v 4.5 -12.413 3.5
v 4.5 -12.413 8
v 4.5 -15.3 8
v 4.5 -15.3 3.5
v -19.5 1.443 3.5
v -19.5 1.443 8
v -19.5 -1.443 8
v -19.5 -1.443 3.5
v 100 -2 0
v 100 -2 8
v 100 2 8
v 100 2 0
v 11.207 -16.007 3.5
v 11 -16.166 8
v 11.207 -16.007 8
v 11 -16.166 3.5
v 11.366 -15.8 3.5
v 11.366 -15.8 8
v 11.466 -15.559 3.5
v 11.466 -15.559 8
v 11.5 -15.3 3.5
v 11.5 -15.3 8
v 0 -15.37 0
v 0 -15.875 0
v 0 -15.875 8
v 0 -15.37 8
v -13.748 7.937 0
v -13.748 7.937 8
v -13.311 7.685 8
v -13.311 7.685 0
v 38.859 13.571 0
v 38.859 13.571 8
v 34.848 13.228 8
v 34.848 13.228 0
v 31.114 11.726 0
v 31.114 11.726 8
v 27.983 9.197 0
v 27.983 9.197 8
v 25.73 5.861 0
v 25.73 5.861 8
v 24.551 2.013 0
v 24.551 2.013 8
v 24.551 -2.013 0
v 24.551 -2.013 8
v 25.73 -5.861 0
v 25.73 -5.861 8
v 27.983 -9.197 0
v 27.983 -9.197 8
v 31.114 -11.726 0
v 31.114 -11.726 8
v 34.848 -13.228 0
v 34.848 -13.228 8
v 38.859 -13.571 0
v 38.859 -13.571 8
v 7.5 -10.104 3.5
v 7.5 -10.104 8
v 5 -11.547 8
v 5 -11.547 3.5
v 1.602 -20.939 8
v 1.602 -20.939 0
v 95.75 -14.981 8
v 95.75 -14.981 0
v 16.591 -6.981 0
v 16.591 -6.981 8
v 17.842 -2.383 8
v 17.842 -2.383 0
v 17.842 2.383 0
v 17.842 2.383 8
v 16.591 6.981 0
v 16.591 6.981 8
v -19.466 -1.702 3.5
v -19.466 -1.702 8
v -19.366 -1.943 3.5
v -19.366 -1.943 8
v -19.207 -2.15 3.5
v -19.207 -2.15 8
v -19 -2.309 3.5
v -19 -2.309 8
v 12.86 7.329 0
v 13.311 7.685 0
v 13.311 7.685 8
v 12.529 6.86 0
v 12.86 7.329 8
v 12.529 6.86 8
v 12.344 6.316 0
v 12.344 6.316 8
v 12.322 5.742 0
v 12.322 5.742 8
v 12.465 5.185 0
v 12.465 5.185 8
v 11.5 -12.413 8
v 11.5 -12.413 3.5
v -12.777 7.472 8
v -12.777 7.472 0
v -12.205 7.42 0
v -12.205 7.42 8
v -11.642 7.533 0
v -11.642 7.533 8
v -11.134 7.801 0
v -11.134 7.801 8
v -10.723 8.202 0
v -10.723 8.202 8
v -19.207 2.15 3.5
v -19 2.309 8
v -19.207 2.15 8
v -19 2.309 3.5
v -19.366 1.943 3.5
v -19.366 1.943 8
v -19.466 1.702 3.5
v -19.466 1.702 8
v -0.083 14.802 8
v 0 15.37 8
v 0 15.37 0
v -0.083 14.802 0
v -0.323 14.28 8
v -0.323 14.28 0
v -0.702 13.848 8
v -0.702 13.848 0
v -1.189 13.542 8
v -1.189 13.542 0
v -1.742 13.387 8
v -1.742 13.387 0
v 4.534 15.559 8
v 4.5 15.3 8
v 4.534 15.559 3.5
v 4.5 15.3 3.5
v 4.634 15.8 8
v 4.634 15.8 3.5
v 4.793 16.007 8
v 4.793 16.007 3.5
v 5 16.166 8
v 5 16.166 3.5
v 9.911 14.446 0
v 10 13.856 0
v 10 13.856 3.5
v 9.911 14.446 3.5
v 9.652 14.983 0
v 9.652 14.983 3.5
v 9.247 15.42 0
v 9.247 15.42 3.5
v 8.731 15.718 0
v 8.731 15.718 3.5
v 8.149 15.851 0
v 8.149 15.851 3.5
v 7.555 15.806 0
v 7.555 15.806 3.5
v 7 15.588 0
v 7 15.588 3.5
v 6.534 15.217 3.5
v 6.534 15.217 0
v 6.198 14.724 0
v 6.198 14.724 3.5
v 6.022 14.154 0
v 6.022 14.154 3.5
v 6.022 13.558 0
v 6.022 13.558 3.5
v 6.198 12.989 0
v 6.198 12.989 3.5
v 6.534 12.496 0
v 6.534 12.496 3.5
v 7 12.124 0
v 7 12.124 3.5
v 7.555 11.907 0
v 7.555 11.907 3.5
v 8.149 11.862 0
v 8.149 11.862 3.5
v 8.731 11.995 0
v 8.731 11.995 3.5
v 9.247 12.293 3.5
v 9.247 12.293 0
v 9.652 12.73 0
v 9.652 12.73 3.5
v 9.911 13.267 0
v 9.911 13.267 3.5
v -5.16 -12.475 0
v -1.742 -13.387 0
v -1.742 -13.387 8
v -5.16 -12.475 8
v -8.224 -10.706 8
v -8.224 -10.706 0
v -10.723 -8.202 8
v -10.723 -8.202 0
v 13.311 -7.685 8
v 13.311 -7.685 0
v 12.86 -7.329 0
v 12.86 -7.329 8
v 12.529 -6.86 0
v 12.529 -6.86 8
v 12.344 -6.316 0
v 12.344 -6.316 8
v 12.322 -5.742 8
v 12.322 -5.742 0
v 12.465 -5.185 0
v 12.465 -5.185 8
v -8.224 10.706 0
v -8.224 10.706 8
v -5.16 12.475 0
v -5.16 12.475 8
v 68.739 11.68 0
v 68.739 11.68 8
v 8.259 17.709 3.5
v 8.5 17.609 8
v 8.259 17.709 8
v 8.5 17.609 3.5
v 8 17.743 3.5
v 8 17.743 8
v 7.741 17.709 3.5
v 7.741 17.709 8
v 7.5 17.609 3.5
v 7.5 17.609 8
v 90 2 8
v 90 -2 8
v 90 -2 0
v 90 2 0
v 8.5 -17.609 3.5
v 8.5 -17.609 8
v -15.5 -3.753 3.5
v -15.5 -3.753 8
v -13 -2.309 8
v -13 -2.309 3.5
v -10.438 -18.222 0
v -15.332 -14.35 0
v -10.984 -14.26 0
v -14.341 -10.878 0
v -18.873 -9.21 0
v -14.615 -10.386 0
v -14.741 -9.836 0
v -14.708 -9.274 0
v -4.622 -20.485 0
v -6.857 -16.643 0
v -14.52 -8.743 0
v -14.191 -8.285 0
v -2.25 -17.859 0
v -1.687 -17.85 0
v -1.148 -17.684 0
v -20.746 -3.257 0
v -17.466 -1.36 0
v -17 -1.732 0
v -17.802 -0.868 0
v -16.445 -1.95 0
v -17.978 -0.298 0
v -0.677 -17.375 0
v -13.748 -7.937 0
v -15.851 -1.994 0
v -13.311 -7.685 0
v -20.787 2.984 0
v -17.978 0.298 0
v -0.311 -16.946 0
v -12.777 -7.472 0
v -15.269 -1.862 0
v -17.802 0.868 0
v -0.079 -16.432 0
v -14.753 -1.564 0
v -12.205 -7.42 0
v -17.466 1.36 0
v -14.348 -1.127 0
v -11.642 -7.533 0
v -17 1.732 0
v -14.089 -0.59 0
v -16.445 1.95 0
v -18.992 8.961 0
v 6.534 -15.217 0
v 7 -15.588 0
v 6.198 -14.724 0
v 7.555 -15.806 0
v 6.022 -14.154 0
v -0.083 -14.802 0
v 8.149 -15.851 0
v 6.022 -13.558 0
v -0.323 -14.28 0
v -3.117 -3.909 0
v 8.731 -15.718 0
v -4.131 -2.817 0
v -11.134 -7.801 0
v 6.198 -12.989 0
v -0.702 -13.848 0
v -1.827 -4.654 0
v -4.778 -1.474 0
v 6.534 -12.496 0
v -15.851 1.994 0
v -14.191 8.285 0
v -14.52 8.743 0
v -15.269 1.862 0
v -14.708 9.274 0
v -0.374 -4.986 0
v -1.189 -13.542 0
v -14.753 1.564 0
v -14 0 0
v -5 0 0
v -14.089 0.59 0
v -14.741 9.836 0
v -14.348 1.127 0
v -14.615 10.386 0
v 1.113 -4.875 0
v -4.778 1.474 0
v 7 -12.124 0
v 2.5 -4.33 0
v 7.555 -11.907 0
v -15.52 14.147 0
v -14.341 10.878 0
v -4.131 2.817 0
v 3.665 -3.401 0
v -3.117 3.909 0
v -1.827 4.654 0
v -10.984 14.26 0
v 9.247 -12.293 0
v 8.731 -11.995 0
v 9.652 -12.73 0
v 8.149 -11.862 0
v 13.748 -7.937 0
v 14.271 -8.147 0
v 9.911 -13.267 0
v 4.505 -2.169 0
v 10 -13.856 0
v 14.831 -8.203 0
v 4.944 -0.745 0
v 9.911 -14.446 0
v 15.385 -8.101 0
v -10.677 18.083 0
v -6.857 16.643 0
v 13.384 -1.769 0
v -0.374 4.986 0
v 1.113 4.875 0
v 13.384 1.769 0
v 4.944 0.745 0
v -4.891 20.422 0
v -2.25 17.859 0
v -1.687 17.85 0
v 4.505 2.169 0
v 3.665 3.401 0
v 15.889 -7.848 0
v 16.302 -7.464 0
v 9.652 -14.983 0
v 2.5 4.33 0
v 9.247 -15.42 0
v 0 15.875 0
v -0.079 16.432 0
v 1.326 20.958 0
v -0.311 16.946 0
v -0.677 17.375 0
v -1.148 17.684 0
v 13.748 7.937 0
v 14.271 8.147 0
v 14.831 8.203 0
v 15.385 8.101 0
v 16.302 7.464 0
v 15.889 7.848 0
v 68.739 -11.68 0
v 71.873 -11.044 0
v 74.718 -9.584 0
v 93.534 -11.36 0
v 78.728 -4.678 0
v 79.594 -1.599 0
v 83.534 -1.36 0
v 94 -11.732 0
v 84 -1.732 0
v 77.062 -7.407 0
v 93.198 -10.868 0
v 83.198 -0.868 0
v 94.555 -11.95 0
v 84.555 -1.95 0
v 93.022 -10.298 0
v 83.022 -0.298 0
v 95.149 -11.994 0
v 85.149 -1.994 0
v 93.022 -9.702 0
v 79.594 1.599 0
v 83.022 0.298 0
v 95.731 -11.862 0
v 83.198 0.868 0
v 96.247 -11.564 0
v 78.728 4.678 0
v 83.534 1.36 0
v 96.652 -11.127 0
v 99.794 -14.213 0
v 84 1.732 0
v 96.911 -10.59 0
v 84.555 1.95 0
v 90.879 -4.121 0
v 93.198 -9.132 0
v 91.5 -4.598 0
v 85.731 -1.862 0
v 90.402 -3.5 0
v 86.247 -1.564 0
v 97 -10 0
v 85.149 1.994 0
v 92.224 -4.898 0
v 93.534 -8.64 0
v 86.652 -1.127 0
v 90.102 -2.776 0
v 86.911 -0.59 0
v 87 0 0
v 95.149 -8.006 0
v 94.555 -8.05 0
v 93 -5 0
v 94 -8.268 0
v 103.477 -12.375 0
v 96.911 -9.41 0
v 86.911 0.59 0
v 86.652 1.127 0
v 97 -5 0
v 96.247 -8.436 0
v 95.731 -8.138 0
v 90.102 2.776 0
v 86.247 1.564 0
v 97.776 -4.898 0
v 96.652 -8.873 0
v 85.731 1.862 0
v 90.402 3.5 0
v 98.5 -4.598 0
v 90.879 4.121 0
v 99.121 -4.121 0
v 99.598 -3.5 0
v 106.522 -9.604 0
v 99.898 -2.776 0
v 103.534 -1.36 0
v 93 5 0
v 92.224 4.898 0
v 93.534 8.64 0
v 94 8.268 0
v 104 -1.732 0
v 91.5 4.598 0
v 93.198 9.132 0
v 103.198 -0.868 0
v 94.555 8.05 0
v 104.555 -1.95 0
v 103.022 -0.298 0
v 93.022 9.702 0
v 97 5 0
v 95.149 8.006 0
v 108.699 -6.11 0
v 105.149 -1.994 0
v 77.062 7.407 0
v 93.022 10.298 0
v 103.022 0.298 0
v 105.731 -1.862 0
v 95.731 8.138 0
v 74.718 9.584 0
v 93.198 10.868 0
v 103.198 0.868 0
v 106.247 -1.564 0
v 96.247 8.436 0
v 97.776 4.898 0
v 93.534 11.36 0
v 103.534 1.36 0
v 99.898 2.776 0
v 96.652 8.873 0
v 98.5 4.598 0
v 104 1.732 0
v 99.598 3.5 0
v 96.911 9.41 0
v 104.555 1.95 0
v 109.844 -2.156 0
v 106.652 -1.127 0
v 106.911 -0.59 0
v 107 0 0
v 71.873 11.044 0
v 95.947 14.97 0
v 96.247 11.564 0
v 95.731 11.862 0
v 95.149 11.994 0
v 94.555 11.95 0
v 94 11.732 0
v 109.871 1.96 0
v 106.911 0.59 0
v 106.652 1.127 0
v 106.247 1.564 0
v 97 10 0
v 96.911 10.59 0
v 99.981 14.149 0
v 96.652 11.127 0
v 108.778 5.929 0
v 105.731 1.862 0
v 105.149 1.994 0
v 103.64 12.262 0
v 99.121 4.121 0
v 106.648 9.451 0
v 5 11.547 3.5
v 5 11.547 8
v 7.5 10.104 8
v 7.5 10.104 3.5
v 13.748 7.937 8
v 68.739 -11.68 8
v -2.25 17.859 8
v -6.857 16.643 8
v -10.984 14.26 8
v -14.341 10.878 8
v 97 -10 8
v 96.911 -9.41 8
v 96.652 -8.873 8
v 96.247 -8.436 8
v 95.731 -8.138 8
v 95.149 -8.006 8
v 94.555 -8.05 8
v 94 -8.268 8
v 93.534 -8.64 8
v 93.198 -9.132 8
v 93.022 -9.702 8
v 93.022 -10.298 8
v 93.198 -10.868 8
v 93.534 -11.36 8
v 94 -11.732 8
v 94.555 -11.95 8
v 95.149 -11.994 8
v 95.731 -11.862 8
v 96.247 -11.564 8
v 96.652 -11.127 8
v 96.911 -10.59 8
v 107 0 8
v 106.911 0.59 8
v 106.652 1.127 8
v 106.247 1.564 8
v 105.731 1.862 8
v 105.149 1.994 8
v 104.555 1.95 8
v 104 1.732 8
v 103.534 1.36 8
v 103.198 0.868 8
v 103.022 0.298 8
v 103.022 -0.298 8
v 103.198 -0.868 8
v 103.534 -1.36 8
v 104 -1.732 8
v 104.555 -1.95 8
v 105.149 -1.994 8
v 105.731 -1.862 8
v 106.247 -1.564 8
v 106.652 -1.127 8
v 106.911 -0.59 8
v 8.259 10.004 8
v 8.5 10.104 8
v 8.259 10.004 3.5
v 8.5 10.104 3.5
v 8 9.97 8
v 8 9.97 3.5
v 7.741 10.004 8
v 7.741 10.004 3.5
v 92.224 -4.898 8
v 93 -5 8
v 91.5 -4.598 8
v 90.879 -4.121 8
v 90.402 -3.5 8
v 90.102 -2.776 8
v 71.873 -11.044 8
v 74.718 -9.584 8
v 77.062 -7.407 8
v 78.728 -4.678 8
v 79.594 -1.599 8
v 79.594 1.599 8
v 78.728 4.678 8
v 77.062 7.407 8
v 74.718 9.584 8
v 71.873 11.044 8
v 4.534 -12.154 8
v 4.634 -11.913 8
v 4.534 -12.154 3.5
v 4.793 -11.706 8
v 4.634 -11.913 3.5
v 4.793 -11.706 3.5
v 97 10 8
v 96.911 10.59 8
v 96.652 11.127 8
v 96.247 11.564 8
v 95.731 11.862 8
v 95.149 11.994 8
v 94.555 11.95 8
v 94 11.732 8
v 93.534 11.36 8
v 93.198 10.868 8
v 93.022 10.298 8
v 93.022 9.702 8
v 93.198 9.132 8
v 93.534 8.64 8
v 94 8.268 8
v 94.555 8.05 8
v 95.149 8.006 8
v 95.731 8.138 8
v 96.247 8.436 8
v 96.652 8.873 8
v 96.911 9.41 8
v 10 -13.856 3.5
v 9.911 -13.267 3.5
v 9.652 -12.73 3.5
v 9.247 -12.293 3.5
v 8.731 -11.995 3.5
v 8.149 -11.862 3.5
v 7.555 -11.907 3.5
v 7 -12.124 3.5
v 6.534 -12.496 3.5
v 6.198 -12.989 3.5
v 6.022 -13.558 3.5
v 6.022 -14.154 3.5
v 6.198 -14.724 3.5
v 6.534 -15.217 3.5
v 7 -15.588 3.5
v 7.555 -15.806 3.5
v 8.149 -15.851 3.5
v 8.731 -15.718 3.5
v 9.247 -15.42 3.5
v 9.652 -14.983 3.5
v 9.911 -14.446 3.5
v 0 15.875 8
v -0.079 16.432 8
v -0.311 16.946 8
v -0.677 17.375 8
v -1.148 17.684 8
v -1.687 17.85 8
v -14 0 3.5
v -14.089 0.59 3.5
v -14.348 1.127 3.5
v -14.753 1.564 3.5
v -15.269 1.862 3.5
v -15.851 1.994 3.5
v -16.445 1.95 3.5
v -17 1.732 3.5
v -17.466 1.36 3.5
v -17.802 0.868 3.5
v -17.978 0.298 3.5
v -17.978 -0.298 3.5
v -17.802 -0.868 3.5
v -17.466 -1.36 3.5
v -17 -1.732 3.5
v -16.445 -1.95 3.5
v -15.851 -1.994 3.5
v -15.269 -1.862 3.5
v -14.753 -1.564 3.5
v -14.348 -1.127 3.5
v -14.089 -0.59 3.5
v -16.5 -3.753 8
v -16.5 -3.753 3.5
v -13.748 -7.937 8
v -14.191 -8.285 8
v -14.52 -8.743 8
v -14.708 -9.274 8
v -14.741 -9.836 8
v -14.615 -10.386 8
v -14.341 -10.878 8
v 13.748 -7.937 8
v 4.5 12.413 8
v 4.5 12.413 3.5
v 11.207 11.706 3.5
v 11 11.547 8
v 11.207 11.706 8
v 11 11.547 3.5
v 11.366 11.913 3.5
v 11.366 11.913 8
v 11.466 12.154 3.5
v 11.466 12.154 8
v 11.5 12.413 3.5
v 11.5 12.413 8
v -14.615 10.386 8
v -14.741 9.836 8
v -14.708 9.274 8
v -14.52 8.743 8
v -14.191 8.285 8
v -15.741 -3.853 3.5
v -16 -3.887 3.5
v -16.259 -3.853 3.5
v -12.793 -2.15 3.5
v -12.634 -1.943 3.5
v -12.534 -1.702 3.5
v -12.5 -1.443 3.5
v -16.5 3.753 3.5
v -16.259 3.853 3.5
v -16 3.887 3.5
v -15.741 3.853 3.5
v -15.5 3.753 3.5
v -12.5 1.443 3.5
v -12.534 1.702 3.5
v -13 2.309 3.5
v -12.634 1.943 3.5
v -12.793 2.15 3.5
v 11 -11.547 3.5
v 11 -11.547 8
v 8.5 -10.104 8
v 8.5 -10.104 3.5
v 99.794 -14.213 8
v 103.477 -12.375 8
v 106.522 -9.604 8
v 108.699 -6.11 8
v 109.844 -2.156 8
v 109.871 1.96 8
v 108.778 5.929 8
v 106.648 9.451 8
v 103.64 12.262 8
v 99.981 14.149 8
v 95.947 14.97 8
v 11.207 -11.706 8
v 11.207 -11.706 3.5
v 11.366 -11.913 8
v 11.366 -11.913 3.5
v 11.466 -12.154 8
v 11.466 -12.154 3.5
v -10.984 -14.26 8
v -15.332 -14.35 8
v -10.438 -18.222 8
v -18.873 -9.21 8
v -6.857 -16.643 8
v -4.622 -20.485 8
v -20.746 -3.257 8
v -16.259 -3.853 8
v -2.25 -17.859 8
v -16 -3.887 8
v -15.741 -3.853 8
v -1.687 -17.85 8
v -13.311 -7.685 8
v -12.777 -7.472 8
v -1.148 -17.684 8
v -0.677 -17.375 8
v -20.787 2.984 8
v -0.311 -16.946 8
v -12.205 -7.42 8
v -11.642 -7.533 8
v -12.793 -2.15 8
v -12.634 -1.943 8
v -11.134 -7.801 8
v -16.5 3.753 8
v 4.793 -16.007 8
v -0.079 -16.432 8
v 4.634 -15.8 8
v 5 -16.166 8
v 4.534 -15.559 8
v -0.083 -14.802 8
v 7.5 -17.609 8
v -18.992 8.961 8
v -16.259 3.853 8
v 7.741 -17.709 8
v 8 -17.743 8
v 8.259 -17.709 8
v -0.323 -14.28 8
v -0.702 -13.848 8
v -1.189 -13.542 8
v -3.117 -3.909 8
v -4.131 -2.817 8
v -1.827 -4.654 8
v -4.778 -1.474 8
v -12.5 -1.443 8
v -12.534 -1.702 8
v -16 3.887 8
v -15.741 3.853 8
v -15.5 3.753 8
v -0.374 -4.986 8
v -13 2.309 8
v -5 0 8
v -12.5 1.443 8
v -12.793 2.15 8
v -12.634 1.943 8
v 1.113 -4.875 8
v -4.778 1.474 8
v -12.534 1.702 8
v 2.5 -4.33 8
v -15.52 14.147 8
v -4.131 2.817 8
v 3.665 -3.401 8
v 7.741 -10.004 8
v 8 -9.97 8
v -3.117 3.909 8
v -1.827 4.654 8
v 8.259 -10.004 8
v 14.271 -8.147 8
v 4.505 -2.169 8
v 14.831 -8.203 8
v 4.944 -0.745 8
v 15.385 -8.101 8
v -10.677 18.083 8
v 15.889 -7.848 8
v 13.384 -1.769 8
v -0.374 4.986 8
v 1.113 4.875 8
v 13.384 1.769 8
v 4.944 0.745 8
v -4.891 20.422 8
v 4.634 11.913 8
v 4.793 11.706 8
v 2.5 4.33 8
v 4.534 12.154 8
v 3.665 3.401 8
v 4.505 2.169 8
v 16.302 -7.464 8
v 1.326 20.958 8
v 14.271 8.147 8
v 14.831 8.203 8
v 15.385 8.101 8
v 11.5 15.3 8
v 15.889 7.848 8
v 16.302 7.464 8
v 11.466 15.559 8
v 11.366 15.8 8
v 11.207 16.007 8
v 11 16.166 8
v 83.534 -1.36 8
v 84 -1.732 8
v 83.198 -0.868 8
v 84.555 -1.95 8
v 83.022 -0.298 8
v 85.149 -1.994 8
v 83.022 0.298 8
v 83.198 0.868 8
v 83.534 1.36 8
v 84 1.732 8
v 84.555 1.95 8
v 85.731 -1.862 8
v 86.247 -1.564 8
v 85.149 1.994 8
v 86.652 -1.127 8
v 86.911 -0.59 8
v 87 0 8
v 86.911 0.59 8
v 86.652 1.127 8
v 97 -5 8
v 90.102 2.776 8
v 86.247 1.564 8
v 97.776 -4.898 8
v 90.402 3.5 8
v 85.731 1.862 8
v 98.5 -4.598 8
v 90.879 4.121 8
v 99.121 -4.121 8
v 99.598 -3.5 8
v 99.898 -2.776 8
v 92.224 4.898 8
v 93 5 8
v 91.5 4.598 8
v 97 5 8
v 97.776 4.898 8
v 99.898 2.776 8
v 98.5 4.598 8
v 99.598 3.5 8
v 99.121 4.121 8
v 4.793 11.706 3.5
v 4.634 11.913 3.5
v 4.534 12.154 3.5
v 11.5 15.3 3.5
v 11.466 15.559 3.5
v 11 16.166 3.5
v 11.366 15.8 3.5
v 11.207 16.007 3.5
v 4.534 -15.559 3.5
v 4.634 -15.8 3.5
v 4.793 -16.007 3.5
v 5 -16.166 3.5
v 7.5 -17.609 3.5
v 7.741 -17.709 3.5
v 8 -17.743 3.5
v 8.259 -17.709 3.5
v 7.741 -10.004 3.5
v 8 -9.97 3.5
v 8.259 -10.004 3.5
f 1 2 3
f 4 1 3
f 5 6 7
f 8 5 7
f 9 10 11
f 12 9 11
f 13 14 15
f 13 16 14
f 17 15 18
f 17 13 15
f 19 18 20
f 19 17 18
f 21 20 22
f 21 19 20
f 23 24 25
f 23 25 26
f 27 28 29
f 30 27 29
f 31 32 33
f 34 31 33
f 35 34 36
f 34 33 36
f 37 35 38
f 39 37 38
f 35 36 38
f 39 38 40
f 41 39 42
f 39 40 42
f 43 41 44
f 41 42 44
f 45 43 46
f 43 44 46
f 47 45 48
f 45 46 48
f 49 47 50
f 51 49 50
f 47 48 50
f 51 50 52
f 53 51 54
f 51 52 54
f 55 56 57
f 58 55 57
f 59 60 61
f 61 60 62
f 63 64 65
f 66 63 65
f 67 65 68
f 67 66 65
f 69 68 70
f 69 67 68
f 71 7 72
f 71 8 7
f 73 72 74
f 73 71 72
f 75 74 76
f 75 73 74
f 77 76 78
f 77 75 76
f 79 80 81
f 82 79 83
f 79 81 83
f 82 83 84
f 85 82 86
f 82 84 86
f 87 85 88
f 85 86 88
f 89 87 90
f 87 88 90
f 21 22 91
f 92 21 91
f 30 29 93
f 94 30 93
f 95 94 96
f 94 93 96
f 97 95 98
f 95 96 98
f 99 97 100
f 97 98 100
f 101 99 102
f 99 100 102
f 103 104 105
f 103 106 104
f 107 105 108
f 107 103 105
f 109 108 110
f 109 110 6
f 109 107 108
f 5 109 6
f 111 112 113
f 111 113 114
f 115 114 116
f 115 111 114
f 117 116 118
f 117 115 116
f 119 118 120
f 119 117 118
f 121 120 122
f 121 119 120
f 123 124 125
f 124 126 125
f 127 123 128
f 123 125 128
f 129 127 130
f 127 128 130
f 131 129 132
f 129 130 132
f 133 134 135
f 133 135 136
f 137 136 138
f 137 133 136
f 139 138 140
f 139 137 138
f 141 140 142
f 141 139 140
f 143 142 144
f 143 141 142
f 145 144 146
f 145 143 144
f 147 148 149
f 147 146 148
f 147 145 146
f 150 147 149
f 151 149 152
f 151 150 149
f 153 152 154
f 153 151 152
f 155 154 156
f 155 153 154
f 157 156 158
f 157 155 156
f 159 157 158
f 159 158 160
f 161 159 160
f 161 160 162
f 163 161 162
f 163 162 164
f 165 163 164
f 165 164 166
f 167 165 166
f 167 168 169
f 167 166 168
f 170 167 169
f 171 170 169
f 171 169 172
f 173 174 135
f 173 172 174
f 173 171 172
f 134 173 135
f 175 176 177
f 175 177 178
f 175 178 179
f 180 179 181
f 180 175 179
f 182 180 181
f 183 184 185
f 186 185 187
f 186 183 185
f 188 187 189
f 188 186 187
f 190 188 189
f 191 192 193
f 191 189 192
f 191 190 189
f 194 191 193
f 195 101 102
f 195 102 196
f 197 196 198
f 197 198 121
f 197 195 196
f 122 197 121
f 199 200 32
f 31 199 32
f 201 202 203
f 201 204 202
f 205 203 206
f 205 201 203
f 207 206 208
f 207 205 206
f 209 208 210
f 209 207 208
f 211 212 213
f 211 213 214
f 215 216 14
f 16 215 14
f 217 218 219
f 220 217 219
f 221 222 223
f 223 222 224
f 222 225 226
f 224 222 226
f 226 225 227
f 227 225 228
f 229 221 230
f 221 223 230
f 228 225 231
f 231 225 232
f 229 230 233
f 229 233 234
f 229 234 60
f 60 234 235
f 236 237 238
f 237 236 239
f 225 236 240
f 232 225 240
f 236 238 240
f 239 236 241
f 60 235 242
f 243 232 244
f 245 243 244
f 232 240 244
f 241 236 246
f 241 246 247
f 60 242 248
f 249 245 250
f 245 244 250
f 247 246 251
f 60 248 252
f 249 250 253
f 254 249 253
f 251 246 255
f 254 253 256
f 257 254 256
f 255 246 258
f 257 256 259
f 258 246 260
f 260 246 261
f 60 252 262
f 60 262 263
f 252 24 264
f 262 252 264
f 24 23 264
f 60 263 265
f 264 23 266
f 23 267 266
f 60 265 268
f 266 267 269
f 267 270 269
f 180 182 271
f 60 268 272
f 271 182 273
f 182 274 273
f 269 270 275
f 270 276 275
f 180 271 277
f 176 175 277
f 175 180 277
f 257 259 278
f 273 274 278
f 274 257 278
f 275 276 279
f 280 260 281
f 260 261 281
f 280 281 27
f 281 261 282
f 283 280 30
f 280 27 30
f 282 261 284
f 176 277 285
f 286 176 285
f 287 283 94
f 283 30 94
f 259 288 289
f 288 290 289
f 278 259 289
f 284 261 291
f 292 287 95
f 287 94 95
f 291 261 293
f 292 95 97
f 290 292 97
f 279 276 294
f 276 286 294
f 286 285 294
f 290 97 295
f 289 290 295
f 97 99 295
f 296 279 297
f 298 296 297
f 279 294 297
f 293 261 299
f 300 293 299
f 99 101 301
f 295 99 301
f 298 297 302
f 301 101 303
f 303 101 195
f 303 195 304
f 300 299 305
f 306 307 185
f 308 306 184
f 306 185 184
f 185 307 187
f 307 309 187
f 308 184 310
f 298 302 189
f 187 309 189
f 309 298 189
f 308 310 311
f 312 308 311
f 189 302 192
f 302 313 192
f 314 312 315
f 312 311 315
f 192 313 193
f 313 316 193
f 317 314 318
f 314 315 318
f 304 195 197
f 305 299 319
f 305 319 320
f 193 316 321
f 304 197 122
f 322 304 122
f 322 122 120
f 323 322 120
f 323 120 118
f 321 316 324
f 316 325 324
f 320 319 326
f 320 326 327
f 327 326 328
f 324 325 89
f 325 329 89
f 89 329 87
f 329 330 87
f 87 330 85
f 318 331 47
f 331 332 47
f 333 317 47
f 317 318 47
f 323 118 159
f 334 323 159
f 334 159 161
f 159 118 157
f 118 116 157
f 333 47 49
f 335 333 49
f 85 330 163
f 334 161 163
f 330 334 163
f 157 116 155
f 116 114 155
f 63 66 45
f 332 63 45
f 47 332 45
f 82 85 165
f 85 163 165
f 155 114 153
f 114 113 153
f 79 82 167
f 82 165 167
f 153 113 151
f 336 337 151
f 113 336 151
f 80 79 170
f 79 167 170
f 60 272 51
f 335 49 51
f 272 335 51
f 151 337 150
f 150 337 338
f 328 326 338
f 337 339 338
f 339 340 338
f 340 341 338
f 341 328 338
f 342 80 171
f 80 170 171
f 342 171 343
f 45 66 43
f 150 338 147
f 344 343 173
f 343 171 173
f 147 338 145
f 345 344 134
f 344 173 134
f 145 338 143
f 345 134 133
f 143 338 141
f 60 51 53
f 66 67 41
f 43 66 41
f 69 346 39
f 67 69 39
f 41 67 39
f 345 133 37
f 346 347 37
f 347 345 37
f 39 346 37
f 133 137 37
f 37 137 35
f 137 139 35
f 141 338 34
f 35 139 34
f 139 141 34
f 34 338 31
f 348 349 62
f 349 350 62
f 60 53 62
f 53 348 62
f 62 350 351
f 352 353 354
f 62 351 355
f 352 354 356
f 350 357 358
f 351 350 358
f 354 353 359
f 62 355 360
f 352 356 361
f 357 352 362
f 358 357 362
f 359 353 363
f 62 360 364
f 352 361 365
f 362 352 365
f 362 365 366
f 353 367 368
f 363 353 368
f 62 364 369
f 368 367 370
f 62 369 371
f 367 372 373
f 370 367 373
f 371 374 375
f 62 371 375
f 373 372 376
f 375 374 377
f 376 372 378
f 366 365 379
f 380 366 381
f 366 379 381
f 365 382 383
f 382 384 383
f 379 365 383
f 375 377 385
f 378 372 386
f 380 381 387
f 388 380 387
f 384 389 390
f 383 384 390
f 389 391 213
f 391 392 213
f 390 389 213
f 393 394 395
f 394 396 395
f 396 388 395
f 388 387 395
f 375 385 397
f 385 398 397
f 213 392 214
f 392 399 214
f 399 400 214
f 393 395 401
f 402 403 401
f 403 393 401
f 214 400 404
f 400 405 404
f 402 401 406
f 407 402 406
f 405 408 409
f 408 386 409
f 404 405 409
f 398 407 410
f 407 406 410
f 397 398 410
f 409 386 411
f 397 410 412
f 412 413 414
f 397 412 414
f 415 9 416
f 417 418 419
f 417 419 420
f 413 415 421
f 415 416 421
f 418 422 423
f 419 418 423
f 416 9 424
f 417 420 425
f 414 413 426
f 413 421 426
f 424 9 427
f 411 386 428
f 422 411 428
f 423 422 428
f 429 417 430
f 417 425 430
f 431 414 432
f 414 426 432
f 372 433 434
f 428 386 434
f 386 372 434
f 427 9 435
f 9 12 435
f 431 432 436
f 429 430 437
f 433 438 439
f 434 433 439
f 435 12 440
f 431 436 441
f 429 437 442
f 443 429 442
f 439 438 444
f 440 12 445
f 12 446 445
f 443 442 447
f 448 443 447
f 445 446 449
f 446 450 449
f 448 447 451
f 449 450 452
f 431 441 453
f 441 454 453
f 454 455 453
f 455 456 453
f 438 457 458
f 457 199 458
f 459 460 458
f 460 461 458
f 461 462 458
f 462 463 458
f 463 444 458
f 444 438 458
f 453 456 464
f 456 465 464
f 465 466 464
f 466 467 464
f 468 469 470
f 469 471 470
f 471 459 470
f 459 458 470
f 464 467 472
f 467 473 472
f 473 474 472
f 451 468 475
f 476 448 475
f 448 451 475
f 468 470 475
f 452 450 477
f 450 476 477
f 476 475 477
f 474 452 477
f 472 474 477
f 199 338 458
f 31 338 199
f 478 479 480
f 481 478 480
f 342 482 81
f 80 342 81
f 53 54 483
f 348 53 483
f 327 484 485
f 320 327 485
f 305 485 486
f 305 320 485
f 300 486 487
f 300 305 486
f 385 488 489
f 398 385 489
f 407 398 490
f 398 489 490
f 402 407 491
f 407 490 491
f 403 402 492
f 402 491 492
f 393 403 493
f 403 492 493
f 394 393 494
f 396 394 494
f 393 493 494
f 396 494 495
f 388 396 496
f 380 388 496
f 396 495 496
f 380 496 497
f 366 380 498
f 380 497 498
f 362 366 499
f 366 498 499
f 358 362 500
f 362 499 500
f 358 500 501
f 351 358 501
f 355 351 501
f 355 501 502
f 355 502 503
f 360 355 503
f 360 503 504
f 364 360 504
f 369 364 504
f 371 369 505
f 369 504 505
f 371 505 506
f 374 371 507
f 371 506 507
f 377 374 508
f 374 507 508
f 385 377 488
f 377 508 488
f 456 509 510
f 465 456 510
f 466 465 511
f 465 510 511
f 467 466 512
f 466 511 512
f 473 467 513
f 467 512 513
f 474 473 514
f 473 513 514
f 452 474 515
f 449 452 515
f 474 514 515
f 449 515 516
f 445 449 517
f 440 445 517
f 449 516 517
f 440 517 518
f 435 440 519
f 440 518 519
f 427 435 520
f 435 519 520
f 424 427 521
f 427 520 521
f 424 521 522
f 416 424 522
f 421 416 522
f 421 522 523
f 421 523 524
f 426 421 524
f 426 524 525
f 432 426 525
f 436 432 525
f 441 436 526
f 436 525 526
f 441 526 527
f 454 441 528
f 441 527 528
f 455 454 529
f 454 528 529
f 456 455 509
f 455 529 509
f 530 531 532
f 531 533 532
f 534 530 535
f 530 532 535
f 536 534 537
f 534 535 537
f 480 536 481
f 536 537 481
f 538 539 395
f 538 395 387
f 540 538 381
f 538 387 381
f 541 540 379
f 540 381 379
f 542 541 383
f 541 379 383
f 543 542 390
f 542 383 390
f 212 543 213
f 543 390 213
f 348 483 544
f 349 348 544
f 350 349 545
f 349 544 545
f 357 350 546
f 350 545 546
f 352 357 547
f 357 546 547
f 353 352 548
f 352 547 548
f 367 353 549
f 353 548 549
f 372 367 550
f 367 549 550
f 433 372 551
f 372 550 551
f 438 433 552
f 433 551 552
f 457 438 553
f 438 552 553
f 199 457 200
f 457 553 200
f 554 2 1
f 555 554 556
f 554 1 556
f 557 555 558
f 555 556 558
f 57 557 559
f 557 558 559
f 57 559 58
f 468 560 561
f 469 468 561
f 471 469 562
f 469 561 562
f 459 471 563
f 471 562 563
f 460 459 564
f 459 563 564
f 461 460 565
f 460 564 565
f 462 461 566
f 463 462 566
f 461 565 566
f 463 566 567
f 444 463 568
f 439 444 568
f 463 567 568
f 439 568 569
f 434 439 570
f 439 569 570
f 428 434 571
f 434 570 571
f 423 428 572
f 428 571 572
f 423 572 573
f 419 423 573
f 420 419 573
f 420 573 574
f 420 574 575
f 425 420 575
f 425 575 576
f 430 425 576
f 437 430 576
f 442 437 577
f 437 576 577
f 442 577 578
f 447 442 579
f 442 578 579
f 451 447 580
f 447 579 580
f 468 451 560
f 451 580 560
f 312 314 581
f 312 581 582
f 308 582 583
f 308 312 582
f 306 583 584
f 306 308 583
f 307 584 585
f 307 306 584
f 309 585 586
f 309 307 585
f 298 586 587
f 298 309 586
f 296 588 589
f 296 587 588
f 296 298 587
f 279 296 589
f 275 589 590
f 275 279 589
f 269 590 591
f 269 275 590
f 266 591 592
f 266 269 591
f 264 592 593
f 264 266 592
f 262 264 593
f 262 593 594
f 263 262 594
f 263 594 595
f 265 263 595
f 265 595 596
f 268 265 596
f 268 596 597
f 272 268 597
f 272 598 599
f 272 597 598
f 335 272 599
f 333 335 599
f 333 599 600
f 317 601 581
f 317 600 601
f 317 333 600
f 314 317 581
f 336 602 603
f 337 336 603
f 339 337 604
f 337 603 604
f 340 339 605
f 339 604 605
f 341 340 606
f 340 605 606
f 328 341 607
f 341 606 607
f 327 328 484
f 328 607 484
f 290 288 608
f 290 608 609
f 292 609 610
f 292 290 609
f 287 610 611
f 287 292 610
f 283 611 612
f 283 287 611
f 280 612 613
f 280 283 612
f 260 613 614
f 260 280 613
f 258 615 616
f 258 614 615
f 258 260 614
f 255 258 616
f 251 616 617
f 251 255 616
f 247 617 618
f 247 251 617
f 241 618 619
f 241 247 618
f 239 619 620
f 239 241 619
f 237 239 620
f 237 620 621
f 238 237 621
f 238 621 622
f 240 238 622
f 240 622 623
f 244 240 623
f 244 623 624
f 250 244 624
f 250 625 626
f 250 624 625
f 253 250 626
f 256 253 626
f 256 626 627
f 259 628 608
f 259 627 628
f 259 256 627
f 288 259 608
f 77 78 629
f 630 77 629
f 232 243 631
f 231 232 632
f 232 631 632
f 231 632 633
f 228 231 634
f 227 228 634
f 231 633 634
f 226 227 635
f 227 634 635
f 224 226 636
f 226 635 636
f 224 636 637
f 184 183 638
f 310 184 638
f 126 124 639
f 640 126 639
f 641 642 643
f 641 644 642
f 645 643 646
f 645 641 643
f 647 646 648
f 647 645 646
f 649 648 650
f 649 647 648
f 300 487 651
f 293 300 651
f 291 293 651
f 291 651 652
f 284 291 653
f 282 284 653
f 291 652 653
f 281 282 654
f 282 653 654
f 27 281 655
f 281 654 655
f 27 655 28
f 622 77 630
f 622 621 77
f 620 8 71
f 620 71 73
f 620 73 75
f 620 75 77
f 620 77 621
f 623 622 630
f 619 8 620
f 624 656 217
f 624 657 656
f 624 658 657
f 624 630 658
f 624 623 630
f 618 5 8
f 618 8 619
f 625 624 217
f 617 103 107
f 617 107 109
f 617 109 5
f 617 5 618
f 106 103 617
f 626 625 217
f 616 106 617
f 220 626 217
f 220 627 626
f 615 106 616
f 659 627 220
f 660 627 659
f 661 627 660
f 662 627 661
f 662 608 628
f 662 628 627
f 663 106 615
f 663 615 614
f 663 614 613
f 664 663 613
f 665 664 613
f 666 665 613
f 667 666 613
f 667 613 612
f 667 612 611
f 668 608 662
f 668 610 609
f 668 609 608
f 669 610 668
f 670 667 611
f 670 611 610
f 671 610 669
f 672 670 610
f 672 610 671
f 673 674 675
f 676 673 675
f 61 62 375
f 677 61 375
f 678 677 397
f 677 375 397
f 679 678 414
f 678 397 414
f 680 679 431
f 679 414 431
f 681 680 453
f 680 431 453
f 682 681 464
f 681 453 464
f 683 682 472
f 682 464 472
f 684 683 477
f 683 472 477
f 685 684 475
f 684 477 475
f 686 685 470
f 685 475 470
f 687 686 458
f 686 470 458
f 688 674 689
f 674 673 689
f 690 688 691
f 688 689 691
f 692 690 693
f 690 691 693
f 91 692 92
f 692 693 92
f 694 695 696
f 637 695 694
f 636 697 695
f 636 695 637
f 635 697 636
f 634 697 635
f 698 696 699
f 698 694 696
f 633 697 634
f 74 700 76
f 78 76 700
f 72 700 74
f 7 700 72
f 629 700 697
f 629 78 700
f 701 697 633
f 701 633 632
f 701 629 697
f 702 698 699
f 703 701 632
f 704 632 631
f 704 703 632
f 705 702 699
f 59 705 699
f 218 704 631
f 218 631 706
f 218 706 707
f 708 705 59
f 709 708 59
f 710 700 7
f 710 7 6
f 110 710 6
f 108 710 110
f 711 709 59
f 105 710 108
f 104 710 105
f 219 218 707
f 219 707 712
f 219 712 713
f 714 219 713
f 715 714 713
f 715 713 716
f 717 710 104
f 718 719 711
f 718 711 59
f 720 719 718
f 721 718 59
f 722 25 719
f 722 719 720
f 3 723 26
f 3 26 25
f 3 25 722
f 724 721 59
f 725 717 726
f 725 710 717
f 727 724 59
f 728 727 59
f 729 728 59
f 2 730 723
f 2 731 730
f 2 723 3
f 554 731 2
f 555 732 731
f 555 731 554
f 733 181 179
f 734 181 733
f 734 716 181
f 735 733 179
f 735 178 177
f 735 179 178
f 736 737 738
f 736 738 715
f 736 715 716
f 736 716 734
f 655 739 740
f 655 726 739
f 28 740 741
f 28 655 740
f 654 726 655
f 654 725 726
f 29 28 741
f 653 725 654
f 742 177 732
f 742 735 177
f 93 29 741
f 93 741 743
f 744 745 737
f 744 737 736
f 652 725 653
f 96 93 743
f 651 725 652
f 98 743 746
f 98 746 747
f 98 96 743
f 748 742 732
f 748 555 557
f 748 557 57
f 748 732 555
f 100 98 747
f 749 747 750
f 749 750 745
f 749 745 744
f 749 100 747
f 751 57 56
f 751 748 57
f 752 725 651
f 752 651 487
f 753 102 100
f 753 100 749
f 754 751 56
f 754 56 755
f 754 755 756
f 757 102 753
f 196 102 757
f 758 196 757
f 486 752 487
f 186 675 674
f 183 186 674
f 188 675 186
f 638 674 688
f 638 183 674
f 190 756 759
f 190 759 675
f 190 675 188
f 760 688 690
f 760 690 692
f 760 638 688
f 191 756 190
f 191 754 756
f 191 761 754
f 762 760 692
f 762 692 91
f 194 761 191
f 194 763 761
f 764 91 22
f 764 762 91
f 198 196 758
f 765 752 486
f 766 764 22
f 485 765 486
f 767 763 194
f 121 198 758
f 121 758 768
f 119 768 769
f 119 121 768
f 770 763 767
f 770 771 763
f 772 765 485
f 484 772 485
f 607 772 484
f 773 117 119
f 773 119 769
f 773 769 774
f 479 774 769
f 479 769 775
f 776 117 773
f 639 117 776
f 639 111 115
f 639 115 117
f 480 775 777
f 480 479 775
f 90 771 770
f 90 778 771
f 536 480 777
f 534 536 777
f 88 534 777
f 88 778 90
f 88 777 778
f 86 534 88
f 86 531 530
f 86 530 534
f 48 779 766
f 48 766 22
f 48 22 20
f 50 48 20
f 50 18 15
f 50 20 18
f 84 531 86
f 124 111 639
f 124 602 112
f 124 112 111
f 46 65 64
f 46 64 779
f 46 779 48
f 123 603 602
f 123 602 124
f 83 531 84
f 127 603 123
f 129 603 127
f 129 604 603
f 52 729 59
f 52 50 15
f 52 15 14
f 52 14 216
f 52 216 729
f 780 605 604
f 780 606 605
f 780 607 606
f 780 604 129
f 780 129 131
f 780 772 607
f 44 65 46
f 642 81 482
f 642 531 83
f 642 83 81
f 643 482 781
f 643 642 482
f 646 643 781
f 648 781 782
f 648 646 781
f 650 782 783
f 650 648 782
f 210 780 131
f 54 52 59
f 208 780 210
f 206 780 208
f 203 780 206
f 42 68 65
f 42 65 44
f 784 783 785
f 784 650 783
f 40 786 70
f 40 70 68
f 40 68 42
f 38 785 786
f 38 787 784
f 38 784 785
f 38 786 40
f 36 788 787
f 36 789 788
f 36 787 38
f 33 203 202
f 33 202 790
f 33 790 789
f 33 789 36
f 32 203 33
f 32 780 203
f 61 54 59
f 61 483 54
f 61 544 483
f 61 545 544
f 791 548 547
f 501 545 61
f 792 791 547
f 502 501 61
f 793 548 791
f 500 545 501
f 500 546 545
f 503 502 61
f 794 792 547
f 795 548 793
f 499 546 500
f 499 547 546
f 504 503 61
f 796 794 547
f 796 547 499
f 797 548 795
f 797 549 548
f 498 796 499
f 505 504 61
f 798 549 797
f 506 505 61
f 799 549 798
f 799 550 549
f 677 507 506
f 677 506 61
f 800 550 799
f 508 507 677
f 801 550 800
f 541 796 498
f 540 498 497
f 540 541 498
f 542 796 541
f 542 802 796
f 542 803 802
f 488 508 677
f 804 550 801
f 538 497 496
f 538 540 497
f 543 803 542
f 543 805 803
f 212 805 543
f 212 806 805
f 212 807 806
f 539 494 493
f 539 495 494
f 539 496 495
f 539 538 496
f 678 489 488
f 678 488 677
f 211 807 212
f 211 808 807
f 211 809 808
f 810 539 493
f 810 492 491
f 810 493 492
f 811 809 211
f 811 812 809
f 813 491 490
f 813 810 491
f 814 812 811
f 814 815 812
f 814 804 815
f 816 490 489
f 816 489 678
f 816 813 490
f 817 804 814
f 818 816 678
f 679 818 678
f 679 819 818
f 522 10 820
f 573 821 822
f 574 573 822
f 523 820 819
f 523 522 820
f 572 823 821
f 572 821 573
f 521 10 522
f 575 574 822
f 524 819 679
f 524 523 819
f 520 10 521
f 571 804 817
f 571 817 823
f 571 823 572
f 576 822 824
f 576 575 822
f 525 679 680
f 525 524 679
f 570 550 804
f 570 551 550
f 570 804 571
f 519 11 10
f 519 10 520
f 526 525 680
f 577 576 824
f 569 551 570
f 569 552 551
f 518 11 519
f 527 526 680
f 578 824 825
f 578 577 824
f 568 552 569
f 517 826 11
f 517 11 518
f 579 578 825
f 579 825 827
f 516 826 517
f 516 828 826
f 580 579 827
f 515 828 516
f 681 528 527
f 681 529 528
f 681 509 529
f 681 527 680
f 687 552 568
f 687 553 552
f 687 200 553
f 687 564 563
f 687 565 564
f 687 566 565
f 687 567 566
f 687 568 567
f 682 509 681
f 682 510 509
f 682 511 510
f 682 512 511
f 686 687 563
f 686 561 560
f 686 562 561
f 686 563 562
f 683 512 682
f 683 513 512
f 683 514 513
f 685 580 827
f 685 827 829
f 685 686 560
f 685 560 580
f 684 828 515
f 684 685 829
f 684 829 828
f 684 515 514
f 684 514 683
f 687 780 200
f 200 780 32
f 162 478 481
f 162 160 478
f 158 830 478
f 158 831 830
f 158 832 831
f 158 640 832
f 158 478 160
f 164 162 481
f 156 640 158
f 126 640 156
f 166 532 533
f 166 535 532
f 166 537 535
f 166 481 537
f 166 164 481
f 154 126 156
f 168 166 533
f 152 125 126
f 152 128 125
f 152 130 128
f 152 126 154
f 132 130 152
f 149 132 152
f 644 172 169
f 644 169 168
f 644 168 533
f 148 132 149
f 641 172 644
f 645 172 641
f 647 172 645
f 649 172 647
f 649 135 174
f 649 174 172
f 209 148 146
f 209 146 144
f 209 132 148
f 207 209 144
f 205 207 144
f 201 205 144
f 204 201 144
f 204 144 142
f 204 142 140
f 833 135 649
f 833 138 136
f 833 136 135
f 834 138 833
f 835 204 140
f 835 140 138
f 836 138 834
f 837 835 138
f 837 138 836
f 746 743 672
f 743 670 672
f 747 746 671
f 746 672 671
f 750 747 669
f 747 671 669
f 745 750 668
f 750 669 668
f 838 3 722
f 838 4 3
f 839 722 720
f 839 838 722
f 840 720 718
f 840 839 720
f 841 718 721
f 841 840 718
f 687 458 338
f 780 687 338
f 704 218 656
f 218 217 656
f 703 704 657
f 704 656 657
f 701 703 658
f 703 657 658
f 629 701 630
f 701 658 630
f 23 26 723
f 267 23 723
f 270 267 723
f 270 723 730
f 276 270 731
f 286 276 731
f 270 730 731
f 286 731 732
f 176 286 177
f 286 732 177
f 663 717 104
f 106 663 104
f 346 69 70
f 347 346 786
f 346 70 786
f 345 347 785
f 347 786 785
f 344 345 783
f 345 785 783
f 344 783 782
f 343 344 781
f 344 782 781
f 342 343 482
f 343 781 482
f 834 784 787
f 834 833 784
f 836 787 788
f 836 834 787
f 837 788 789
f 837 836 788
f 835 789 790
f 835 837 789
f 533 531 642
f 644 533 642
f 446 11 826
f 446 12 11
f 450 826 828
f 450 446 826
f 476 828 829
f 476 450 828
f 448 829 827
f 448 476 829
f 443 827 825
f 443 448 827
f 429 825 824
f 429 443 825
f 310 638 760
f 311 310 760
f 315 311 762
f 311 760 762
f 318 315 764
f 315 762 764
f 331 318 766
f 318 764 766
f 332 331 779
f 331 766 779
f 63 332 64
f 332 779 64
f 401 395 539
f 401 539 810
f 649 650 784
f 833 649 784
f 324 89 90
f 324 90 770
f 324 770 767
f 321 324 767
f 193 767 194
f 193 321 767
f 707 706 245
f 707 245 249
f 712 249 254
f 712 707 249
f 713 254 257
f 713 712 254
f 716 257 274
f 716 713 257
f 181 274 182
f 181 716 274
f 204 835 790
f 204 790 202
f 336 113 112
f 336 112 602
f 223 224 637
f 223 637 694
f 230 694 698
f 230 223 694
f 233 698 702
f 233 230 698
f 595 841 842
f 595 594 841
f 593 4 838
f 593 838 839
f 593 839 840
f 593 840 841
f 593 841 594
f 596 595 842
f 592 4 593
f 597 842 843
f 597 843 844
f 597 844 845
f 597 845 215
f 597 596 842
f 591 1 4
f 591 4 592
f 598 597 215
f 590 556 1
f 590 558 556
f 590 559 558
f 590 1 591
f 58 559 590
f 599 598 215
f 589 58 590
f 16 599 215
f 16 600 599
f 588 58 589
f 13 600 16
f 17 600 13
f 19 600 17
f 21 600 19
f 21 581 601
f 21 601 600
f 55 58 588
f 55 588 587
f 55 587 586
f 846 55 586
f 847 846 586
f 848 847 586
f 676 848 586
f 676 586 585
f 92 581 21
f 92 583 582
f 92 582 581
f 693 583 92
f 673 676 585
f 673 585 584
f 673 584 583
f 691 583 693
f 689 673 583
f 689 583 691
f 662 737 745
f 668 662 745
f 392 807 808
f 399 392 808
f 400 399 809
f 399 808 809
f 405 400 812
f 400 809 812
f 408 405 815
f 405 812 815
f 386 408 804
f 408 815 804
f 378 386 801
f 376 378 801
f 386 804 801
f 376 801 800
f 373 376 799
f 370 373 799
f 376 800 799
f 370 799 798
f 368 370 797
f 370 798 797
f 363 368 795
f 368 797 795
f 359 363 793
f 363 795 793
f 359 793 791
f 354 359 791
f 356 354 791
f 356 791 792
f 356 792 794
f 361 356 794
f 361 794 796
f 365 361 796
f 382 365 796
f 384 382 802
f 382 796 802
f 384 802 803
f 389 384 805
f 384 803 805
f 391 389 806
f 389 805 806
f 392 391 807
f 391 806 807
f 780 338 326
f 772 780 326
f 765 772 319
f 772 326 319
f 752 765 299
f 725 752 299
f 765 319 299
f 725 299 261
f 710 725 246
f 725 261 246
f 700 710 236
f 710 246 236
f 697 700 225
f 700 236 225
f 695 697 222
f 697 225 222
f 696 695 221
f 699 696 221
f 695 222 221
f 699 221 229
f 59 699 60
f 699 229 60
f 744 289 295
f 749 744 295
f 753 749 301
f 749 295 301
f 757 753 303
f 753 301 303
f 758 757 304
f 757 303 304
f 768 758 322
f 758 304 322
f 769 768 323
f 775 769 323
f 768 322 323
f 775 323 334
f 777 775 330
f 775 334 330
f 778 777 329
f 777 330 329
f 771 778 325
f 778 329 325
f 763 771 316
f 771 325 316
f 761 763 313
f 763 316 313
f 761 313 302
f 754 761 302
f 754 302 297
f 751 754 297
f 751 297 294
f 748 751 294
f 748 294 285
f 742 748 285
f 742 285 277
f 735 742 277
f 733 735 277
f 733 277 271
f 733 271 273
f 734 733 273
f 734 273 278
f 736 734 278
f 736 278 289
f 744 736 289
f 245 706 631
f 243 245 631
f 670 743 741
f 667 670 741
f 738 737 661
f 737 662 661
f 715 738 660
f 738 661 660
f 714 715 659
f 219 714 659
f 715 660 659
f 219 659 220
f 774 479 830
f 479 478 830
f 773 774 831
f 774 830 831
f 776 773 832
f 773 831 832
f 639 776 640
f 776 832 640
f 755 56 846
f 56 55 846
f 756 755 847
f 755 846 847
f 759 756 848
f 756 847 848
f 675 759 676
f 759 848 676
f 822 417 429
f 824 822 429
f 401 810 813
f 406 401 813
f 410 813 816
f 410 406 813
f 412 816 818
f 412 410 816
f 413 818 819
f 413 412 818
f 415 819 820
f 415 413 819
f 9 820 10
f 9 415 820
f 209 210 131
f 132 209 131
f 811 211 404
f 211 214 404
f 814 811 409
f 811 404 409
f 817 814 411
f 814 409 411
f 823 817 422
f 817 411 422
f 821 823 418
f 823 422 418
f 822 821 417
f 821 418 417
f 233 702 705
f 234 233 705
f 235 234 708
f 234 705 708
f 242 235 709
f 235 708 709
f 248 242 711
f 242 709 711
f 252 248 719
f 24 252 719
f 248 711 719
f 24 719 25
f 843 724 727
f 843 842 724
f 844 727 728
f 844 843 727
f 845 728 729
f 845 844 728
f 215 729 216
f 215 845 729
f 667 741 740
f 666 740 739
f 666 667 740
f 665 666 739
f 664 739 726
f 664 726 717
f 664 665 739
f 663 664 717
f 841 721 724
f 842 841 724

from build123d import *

# Parameters (mm, degrees)
SKETCH_1_R           = 21
SKETCH_1_R_2         = 2
EXTRUDE_1_DEPTH      = 8
EXTRUDE_START        = -7
SKETCH_1_3_R         = 20
SKETCH_1_3_R_2       = 2
EXTRUDE_2_DEPTH      = 7
SKETCH_3_R           = 5
CUT_EXTRUDE_10_DEPTH = 25
CUT_EXTRUDE_11_DEPTH = 25
FILLET_8_R           = 2
EXTRUDE_START_2      = -8
EXTRUDE_4_DEPTH      = 8
SKETCH_14_R          = 2
CUT_EXTRUDE_13_DEPTH = 8
SKETCH_15_W          = 10
SKETCH_15_H          = 10
CUT_EXTRUDE_14_DEPTH = 20
CUT_EXTRUDE_START    = 26
SKETCH_16_R          = 20
CUT_EXTRUDE_15_DEPTH = 26
CUT_EXTRUDE_16_DEPTH = 4.5
CUT_EXTRUDE_17_DEPTH = 10
FILLET_9_R           = 1
FILLET_10_R          = 3


with BuildPart() as part:
    # 草图1 → 凸台-拉伸1 (new body)
    with BuildSketch(Plane.XY):
        Circle(SKETCH_1_R)
        with Locations((8, 13.856406461)):
            Circle(SKETCH_1_R_2, mode=Mode.SUBTRACT)
        with Locations((8, -13.856406461)):
            Circle(SKETCH_1_R_2, mode=Mode.SUBTRACT)
        with Locations((-16, 0)):
            Circle(SKETCH_1_R_2, mode=Mode.SUBTRACT)
    extrude(amount=EXTRUDE_1_DEPTH)

    # 草图1<3> → 凸台-拉伸2 (add)
    with BuildSketch(Plane.XY.offset(EXTRUDE_START)):
        Circle(SKETCH_1_3_R)
        with Locations((8, -13.856406461)):
            Circle(SKETCH_1_3_R_2, mode=Mode.SUBTRACT)
        with Locations((-16, 0)):
            Circle(SKETCH_1_3_R_2, mode=Mode.SUBTRACT)
        with Locations((8, 13.856406461)):
            Circle(SKETCH_1_3_R_2, mode=Mode.SUBTRACT)
    extrude(amount=EXTRUDE_2_DEPTH)

    # 草图3 → 切除-拉伸10 (cut)
    with BuildSketch(Plane(origin=(0, 0, -7), x_dir=(-1, 0, 0), z_dir=(0, 0, -1))):
        Circle(SKETCH_3_R)
    extrude(amount=-CUT_EXTRUDE_10_DEPTH, mode=Mode.SUBTRACT)

    # 草图7 → 切除-拉伸11 (cut)
    with BuildSketch(Plane(origin=(0, 0, -7), x_dir=(-1, 0, 0), z_dir=(0, 0, -1))):
        with BuildLine():
            Line((0, 13.5), (0, 18))
            ThreePointArc((0, 18), (9, 15.588457268), (15.588457268, 9))
            Line((15.588457268, 9), (11.691342951, 6.75))
            ThreePointArc((11.691342951, 6.75), (6.75, 11.691342951), (0, 13.5))
        make_face()
        with BuildLine():
            Line((11.691342951, -6.75), (15.588457268, -9))
            ThreePointArc((15.588457268, -9), (9, -15.588457268), (0, -18))
            Line((0, -18), (0, -13.5))
            ThreePointArc((0, -13.5), (6.75, -11.691342951), (11.691342951, -6.75))
        make_face()
        with BuildLine():
            Line((-11.691342951, -6.75), (-15.588457268, -9))
            ThreePointArc((-15.588457268, -9), (-18, 0), (-15.588457268, 9))
            Line((-15.588457268, 9), (-11.691342951, 6.75))
            ThreePointArc((-11.691342951, 6.75), (-13.5, 0), (-11.691342951, -6.75))
        make_face()
    extrude(amount=-CUT_EXTRUDE_11_DEPTH, mode=Mode.SUBTRACT)

    # 圆角8
    fillet_8_edges = [part.edges().sort_by_distance(p)[0] for p in [
        (0, 13.5, 0.5),
        (0, 18, 0.5),
        (0, -18, 0.5),
        (0, -13.5, 0.5),
        (-11.691342951, -6.75, 0.5),
        (-15.588457268, -9, 0.5),
        (15.588457268, 9, 0.5),
        (11.691342951, 6.75, 0.5),
        (11.691342951, -6.75, 0.5),
        (15.588457268, -9, 0.5),
        (-11.691342951, 6.75, 0.5),
        (-15.588457268, 9, 0.5),
    ]]
    fillet(fillet_8_edges, radius=FILLET_8_R)

    # 草图12 → 凸台-拉伸4 (add)
    with BuildSketch(Plane.XY.offset(8).offset(EXTRUDE_START_2)):
        with BuildLine():
            Line((95.947368421, 14.970053209), (1.326315789, 20.958074492))
            ThreePointArc((1.326315789, 20.958074492), (15.310986767, 14.372671436), (21, 0))
            ThreePointArc((21, 0), (15.405284749, -14.271552186), (1.602171257, -20.93879288))
            Line((1.602171257, -20.93879288), (95.75, -14.981238267))
            ThreePointArc((95.75, -14.981238267), (109.999674335, -0.09884255), (95.947368421, 14.970053209))
        make_face()
    extrude(amount=EXTRUDE_4_DEPTH)

    # 草图14 → 切除-拉伸13 (cut)
    with BuildSketch(Plane.XY.offset(8)):
        with Locations((95, 10)):
            Circle(SKETCH_14_R)
        with Locations((105, 0)):
            Circle(SKETCH_14_R)
        with Locations((95, -10)):
            Circle(SKETCH_14_R)
        with Locations((85, 0)):
            Circle(SKETCH_14_R)
    extrude(amount=-CUT_EXTRUDE_13_DEPTH, mode=Mode.SUBTRACT)

    # 草图15 → 切除-拉伸14 (cut)
    with BuildSketch(Plane.XY.offset(8)):
        with Locations((95, 0)):
            Rectangle(SKETCH_15_W, SKETCH_15_H)
    extrude(amount=-CUT_EXTRUDE_14_DEPTH, mode=Mode.SUBTRACT)

    # 草图16 → 切除-拉伸15 (cut)
    with BuildSketch(Plane(origin=(0, 0, 0), x_dir=(-1, 0, 0), z_dir=(0, 0, -1)).offset(CUT_EXTRUDE_START)):
        Circle(SKETCH_16_R)
    extrude(amount=-CUT_EXTRUDE_15_DEPTH, mode=Mode.SUBTRACT)

    # 草图17 → 切除-拉伸16 (cut)
    with BuildSketch(Plane.XY.offset(8)):
        Polygon((4.5, -11.835680518), (4.5, -15.877132403), (8, -17.897858345), (11.5, -15.877132403), (11.5, -11.835680518), (8, -9.814954576), align=None)
        Polygon((8, 9.814954576), (11.5, 11.835680518), (11.5, 15.877132403), (8, 17.897858345), (4.5, 15.877132403), (4.5, 11.835680518), align=None)
        Polygon((-12.5, 2.020725942), (-16, 4.041451884), (-19.5, 2.020725942), (-19.5, -2.020725942), (-16, -4.041451884), (-12.5, -2.020725942), align=None)
    extrude(amount=-CUT_EXTRUDE_16_DEPTH, mode=Mode.SUBTRACT)

    # 草图13 → 切除-拉伸17 (cut)
    with BuildSketch(Plane.XY.offset(8)):
        with BuildLine():
            Line((68.739124089, 11.680451578), (38.858770913, 13.571242245))
            ThreePointArc((38.858770913, 13.571242245), (24.401613936, 0), (38.858770913, -13.571242245))
            Line((38.858770913, -13.571242245), (68.739124089, -11.680451578))
            ThreePointArc((68.739124089, -11.680451578), (79.70381363, 0), (68.739124089, 11.680451578))
        make_face()
    extrude(amount=-CUT_EXTRUDE_17_DEPTH, mode=Mode.SUBTRACT)

    # 圆角9
    fillet_9_edges = [part.edges().sort_by_distance(p)[0] for p in [
        (-12.5, 2.020725942, 5.75),
        (-16, 4.041451884, 5.75),
        (-19.5, 2.020725942, 5.75),
        (-19.5, -2.020725942, 5.75),
        (-16, -4.041451884, 5.75),
        (-12.5, -2.020725942, 5.75),
        (4.5, -11.835680518, 5.75),
        (4.5, -15.877132403, 5.75),
        (8, -17.897858345, 5.75),
        (11.5, -15.877132403, 5.75),
        (11.5, -11.835680518, 5.75),
        (8, -9.814954576, 5.75),
        (8, 9.814954576, 5.75),
        (11.5, 11.835680518, 5.75),
        (4.5, 15.877132403, 5.75),
        (4.5, 11.835680518, 5.75),
        (11.5, 15.877132403, 5.75),
        (8, 17.897858345, 5.75),
    ]]
    fillet(fillet_9_edges, radius=FILLET_9_R)

    # 圆角10
    fillet_10_edges = [part.edges().sort_by_distance(p)[0] for p in [
        (90, -5, 4),
        (100, -5, 4),
        (100, 5, 4),
        (90, 5, 4),
    ]]
    fillet(fillet_10_edges, radius=FILLET_10_R)


solid = part.part
